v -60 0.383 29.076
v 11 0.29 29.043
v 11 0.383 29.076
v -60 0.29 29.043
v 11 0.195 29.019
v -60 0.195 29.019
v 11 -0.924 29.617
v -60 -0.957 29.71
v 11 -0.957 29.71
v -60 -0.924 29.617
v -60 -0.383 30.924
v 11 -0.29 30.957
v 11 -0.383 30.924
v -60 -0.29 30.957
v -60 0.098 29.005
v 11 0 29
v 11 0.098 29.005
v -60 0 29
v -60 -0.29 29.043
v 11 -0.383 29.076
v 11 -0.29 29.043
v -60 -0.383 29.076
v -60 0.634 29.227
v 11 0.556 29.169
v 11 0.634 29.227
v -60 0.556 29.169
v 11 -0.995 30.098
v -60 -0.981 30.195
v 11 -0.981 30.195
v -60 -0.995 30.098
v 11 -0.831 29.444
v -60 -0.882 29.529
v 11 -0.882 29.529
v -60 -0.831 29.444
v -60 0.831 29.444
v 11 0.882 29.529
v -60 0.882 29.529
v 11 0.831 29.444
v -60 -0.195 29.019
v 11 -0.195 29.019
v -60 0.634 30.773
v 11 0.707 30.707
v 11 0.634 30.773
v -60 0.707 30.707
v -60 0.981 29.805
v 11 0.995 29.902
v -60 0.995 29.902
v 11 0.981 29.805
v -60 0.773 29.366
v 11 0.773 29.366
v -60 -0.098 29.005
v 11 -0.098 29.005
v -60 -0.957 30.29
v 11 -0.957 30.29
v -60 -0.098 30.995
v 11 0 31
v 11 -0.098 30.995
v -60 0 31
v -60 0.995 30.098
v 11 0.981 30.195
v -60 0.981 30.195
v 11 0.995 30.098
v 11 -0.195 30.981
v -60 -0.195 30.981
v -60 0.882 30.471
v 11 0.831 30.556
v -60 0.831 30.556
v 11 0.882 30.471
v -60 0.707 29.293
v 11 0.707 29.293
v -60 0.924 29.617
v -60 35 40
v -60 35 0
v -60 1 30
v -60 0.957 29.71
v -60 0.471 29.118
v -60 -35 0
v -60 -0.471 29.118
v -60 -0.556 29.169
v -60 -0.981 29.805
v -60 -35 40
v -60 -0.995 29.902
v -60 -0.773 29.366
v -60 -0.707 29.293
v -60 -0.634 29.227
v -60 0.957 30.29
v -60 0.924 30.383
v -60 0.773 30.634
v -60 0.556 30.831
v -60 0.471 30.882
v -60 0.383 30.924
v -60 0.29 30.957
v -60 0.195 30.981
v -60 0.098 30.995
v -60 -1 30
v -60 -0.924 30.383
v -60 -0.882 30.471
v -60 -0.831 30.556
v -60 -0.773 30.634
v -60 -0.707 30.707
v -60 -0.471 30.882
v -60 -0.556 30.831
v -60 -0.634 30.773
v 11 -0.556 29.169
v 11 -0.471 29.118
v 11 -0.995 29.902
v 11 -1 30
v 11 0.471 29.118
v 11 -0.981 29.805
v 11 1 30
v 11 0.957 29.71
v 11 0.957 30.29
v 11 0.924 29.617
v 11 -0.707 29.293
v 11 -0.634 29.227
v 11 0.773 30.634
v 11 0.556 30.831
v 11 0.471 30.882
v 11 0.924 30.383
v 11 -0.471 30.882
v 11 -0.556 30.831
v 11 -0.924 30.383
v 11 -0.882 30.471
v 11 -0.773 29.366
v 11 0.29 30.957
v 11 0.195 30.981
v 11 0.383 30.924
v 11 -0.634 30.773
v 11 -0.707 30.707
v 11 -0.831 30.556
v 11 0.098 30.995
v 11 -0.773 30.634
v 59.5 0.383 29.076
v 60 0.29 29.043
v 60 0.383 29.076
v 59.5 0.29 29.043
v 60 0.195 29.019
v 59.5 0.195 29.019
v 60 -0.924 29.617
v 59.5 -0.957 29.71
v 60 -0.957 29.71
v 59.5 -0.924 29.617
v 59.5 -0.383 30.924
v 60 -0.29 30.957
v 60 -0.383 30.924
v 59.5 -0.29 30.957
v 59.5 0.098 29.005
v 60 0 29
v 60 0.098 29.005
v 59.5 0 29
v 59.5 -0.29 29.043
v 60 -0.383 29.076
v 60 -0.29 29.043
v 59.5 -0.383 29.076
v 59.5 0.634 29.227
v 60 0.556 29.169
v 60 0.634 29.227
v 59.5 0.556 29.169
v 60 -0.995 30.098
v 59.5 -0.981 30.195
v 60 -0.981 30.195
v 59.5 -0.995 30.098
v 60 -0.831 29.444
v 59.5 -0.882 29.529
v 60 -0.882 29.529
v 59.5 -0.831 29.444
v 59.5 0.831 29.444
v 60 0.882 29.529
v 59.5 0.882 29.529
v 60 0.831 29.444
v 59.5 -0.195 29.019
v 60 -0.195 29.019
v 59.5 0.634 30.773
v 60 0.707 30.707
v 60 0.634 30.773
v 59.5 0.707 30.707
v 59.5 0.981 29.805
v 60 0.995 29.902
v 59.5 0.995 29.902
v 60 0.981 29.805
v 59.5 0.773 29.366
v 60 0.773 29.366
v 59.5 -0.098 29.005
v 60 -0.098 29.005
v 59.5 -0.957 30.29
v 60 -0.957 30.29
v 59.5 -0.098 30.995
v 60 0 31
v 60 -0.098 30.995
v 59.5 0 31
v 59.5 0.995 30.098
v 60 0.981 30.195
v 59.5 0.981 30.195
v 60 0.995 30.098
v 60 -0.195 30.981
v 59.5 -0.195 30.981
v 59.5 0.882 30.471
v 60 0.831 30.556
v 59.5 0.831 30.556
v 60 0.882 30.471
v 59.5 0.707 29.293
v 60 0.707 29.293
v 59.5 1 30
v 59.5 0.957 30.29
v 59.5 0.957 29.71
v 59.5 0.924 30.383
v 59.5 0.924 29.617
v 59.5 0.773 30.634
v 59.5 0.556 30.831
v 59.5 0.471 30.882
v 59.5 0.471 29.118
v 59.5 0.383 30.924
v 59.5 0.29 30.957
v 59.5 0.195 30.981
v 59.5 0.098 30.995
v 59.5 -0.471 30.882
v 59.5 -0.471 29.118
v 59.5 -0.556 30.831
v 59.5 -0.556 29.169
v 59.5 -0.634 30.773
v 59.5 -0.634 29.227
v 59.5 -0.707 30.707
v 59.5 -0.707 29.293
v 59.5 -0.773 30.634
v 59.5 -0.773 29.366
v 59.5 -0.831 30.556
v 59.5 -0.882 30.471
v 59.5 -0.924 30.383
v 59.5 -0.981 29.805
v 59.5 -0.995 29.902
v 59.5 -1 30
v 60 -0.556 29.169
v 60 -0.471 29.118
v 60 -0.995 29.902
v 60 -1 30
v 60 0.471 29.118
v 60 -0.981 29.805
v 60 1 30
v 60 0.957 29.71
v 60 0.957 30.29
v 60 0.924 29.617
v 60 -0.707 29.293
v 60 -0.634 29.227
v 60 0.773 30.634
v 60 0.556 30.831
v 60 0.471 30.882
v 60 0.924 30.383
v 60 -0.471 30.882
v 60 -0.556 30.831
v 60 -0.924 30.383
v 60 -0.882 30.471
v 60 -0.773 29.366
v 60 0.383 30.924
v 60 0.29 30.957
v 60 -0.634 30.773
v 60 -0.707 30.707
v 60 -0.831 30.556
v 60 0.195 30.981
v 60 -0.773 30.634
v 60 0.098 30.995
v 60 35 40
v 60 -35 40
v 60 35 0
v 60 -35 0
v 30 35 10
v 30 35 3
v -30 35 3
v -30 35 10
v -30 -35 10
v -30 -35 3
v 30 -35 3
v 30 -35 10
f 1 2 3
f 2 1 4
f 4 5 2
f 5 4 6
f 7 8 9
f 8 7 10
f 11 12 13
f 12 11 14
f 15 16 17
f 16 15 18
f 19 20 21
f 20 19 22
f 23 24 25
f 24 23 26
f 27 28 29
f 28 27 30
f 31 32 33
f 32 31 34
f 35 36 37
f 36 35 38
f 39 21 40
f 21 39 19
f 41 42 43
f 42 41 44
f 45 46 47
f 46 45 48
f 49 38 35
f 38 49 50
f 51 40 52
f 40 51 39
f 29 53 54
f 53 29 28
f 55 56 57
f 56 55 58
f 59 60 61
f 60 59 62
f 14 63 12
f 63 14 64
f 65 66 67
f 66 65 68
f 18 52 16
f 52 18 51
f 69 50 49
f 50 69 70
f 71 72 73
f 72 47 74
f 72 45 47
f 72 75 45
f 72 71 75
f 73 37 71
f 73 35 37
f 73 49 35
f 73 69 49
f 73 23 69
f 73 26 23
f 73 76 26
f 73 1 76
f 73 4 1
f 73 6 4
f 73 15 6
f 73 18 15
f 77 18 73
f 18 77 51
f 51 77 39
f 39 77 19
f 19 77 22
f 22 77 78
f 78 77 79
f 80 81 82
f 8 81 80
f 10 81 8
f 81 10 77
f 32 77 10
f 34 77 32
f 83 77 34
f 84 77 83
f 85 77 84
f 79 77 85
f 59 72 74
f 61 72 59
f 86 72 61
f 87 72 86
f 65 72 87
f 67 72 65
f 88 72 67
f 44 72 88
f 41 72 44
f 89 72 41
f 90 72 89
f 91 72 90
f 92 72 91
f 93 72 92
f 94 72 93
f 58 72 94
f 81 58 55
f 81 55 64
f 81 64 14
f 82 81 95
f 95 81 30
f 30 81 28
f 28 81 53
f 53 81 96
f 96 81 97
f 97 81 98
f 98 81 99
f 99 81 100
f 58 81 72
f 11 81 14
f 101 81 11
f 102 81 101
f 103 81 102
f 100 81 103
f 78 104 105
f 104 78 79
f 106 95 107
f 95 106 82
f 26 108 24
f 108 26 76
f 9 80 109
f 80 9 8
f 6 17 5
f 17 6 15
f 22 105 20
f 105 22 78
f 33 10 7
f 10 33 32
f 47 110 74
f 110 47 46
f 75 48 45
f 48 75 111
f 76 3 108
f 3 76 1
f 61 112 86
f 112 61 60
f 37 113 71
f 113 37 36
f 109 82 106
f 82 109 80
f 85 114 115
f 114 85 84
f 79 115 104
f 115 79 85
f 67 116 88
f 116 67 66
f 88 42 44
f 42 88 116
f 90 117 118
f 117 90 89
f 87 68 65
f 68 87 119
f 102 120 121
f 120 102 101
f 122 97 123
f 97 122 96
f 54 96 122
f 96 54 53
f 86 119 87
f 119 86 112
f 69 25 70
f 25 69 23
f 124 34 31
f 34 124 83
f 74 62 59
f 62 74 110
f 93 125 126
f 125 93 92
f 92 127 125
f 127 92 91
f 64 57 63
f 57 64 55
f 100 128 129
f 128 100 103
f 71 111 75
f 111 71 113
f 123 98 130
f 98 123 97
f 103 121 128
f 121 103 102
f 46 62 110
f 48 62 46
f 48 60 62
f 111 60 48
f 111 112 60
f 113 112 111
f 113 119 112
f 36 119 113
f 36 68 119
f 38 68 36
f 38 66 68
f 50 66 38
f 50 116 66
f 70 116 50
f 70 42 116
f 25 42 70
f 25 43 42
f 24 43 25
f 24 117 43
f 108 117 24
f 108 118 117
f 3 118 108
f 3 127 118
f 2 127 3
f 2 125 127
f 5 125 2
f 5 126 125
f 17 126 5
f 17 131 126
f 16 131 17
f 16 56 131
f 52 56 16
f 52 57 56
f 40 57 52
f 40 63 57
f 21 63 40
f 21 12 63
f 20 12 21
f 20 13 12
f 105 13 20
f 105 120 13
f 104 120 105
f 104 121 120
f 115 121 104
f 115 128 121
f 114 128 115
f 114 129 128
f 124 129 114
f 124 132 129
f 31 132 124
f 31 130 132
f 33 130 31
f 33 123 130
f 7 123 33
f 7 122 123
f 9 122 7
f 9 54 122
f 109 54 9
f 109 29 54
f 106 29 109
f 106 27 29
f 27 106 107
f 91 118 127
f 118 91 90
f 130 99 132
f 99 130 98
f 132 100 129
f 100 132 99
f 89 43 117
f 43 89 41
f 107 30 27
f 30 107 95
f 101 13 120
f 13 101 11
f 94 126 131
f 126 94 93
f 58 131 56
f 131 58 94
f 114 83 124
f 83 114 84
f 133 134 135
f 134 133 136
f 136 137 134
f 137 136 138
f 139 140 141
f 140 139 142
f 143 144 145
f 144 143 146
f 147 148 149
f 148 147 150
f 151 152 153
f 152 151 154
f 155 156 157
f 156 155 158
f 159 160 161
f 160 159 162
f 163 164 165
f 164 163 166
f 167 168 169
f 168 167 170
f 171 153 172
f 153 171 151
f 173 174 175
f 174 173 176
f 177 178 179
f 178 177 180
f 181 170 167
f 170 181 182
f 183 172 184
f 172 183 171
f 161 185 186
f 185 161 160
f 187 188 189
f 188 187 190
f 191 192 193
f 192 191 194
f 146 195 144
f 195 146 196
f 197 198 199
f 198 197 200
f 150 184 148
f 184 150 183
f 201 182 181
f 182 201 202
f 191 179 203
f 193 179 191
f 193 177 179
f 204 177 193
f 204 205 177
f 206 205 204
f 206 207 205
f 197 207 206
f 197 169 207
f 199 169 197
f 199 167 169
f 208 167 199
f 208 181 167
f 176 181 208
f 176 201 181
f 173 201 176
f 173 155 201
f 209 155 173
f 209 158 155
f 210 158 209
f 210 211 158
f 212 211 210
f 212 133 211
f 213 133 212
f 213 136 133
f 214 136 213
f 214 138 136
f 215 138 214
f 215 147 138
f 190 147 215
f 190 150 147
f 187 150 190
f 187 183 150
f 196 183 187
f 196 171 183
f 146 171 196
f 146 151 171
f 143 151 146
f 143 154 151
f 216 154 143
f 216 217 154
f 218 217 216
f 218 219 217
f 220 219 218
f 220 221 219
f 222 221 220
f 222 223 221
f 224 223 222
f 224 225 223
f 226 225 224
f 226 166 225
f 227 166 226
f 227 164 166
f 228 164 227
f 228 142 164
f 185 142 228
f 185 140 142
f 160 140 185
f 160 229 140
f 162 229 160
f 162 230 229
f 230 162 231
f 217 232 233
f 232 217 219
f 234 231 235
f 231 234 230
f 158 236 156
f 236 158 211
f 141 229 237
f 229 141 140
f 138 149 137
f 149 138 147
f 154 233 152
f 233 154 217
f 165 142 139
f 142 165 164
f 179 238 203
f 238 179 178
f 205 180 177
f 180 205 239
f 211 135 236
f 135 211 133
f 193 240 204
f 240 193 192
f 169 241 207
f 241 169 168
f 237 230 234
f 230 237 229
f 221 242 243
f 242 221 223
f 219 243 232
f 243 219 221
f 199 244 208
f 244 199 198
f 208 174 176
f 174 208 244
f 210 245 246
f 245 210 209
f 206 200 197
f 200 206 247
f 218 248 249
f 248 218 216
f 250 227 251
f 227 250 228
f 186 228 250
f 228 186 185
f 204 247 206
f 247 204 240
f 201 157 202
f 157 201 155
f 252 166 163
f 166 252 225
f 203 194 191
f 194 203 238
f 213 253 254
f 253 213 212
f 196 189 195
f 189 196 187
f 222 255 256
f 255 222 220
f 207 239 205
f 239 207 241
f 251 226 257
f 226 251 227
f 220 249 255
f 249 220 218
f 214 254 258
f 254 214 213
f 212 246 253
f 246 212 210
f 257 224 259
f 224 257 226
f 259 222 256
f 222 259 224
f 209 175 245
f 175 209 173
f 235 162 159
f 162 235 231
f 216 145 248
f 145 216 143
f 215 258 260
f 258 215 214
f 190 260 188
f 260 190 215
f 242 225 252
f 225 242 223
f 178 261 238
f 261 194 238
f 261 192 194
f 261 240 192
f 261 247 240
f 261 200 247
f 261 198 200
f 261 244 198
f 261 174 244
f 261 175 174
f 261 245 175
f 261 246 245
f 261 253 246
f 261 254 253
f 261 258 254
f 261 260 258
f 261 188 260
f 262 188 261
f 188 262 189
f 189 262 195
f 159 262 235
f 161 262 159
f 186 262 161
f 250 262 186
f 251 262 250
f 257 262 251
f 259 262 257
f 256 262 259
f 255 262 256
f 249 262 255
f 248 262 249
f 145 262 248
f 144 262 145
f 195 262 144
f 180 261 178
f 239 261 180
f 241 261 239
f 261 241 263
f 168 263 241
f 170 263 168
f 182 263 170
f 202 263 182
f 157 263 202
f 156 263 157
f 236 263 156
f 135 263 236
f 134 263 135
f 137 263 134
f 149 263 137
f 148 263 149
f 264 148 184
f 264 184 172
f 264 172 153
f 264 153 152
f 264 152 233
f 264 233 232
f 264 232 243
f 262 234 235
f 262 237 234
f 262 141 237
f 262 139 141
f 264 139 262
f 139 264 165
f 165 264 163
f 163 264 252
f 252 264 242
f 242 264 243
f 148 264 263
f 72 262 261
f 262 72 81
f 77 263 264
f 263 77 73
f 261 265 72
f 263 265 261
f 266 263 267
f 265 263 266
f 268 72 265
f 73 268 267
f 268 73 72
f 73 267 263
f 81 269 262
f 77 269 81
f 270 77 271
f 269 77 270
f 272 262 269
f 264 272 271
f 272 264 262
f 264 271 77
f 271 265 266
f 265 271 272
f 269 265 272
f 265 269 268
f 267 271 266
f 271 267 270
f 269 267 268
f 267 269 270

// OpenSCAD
// Mini horizontal gel-electrophoresis box - buffer tank
// Print orientation: tank rests on XY plane, builds upward (+Z)

$fn = 64;

// ---- Tank dimensions ----
tank_x      = 120;   // outer length in X (mm)
tank_y      = 70;    // outer width in Y (mm)
tank_h      = 40;    // outer height in Z (mm)
wall        = 3;     // wall thickness (mm)
floor       = 3;     // floor thickness (mm)

// ---- Platform dimensions ----
plat_x      = 60;    // platform length in X (mm), centred
plat_top_z  = 10;    // platform top height above tank bottom (mm)

// ---- Electrode holes ----
hole_d      = 2;     // horizontal hole diameter (mm)
hole_y      = 0;     // hole centre Y (mm)
hole_z      = 30;    // hole centre Z (mm)

// ---- Derived ----
inner_h = tank_h - floor;   // inner floor height above tank bottom
eps     = 0.5;              // cutter overshoot past faces

difference() {
    // Tank body (open top)
    translate([-tank_x/2, -tank_y/2, 0])
        cube([tank_x, tank_y, tank_h]);

    // Raised platform, full inner width (Y), centred in X
    translate([-plat_x/2, -tank_y/2, floor])
        cube([plat_x, tank_y, plat_top_z - floor]);

    // Horizontal electrode holes through each end wall (along X)
    for (sx = [-1, 1])
        translate([sx > 0 ? tank_x/2 - eps : -tank_x/2, hole_y, hole_z])
            rotate([0, 90, 0])
                cylinder(d = hole_d, h = tank_y + 2*eps);
}
